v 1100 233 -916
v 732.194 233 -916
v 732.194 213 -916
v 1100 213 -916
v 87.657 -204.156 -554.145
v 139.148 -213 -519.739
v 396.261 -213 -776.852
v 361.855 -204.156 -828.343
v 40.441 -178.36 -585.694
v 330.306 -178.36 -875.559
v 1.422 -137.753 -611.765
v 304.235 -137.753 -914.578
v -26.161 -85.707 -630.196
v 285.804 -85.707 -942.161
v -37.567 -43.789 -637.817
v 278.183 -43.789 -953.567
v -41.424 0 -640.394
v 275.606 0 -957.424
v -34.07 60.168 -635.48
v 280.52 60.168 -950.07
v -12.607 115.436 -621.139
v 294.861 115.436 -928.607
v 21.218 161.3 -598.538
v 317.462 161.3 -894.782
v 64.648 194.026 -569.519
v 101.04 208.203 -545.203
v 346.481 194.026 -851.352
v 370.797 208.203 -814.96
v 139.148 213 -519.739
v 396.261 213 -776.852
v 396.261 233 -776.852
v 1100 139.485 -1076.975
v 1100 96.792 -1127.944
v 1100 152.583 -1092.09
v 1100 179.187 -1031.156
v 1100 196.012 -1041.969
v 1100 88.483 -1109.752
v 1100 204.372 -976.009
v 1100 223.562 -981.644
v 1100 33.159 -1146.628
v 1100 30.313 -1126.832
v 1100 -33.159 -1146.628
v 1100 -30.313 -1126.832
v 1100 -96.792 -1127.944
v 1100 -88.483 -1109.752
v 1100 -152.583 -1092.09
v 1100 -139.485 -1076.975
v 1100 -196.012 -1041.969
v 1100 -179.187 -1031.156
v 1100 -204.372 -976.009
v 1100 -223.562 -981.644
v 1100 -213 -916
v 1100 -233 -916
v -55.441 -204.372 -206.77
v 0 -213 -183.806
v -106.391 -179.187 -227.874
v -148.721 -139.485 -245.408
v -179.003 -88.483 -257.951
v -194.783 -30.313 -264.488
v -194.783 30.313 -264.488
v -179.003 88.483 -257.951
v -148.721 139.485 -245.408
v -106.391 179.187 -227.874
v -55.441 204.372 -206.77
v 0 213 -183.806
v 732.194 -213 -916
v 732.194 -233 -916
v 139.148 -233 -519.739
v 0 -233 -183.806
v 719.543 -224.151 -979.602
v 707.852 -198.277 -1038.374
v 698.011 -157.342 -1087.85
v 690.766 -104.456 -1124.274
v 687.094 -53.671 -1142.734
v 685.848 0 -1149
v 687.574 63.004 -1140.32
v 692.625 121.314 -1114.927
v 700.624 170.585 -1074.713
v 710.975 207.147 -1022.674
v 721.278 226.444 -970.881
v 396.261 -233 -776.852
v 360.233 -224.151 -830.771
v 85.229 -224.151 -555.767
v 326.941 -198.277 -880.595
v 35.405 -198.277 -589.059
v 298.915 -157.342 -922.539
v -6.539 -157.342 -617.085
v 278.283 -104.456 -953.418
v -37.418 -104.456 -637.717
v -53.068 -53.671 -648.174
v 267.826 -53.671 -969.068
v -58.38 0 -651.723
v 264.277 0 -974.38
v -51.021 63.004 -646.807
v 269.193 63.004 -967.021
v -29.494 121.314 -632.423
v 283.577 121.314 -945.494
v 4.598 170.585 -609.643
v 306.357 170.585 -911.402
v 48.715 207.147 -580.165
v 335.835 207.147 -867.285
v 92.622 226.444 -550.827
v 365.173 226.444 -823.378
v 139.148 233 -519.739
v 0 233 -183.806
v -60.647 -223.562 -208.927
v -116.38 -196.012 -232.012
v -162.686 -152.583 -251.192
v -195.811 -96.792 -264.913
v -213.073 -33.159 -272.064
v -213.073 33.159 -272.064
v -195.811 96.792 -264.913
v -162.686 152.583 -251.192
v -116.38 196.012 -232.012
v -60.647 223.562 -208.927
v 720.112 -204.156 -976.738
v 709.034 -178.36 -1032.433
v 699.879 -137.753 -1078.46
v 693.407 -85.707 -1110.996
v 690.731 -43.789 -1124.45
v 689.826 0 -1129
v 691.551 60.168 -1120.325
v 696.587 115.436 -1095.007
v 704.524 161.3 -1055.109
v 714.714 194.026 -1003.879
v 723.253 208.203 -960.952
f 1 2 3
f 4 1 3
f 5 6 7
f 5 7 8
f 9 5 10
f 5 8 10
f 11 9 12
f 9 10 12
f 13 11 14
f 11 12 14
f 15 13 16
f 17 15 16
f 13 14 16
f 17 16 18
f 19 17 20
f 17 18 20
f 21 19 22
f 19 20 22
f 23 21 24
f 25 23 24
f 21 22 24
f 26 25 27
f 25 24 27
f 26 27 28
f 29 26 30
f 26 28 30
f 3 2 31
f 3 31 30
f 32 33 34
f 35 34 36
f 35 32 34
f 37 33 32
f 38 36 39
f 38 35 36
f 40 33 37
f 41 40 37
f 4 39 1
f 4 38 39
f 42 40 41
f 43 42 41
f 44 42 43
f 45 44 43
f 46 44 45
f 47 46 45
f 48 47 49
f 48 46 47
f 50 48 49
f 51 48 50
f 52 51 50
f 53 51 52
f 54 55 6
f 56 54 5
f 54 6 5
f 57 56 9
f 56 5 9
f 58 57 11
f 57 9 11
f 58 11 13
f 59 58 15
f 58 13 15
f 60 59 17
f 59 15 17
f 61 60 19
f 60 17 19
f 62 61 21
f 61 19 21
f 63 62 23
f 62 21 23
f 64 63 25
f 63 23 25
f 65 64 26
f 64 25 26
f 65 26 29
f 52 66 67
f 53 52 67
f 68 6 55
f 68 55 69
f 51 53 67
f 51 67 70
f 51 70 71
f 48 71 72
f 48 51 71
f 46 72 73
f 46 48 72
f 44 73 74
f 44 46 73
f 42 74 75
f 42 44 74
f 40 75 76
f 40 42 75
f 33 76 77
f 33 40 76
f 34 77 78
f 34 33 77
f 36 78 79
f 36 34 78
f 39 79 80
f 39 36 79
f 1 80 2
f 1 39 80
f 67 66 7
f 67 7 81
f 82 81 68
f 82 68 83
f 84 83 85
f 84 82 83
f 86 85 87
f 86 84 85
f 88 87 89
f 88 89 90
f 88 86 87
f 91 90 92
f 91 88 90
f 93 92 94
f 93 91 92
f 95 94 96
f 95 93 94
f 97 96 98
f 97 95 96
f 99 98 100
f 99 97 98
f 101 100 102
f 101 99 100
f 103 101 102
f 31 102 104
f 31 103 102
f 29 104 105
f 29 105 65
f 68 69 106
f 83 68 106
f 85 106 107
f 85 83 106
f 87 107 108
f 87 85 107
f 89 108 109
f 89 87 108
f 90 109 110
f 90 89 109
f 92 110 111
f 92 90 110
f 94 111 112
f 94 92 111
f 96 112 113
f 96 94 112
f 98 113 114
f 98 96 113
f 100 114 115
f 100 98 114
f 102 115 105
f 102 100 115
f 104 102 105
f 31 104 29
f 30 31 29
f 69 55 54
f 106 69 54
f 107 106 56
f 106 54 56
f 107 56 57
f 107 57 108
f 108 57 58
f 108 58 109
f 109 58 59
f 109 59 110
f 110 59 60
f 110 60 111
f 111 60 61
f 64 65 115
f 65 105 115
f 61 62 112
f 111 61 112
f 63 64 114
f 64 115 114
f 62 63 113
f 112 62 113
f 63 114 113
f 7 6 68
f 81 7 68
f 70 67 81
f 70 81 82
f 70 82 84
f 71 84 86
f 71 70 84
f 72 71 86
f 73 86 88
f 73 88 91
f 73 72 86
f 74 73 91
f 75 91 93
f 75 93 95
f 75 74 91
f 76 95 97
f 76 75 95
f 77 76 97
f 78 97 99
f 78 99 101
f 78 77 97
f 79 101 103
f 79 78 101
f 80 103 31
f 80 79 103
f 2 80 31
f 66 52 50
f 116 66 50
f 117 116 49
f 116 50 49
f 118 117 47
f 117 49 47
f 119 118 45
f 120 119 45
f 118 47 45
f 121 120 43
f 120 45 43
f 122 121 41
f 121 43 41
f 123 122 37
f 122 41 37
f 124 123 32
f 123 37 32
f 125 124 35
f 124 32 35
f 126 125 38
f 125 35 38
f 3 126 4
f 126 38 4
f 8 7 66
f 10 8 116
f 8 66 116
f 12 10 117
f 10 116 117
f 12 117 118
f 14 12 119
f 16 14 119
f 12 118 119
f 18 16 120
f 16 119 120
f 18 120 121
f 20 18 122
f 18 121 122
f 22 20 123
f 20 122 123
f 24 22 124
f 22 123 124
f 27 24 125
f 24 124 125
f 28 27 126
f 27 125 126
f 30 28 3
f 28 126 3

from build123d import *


with BuildPart() as f3:
    # F3: sweep along a path in F0
    with BuildLine(Plane.XZ) as f3_path:
        Line((0, -183.805903785), (139.1482145694, -519.7394105784))
        Line((139.1482145694, -519.7394105784), (396.2605894216, -776.8517854306))
        Line((396.2605894216, -776.8517854306), (732.194096215, -916))
        Line((732.194096215, -916), (1100, -916))
    # F2 (on line) → F3 (sweep)
    with BuildSketch(Plane.YZ.offset(1100)):
        with BuildLine():
            ThreePointArc((213, -916), (0, -1129), (-213, -916))
            Line((-213, -916), (-233, -916))
            ThreePointArc((-233, -916), (0, -1149), (233, -916))
            Line((233, -916), (213, -916))
        make_face()
    sweep(path=f3_path.line, transition=Transition.RIGHT)


solid = f3.part
